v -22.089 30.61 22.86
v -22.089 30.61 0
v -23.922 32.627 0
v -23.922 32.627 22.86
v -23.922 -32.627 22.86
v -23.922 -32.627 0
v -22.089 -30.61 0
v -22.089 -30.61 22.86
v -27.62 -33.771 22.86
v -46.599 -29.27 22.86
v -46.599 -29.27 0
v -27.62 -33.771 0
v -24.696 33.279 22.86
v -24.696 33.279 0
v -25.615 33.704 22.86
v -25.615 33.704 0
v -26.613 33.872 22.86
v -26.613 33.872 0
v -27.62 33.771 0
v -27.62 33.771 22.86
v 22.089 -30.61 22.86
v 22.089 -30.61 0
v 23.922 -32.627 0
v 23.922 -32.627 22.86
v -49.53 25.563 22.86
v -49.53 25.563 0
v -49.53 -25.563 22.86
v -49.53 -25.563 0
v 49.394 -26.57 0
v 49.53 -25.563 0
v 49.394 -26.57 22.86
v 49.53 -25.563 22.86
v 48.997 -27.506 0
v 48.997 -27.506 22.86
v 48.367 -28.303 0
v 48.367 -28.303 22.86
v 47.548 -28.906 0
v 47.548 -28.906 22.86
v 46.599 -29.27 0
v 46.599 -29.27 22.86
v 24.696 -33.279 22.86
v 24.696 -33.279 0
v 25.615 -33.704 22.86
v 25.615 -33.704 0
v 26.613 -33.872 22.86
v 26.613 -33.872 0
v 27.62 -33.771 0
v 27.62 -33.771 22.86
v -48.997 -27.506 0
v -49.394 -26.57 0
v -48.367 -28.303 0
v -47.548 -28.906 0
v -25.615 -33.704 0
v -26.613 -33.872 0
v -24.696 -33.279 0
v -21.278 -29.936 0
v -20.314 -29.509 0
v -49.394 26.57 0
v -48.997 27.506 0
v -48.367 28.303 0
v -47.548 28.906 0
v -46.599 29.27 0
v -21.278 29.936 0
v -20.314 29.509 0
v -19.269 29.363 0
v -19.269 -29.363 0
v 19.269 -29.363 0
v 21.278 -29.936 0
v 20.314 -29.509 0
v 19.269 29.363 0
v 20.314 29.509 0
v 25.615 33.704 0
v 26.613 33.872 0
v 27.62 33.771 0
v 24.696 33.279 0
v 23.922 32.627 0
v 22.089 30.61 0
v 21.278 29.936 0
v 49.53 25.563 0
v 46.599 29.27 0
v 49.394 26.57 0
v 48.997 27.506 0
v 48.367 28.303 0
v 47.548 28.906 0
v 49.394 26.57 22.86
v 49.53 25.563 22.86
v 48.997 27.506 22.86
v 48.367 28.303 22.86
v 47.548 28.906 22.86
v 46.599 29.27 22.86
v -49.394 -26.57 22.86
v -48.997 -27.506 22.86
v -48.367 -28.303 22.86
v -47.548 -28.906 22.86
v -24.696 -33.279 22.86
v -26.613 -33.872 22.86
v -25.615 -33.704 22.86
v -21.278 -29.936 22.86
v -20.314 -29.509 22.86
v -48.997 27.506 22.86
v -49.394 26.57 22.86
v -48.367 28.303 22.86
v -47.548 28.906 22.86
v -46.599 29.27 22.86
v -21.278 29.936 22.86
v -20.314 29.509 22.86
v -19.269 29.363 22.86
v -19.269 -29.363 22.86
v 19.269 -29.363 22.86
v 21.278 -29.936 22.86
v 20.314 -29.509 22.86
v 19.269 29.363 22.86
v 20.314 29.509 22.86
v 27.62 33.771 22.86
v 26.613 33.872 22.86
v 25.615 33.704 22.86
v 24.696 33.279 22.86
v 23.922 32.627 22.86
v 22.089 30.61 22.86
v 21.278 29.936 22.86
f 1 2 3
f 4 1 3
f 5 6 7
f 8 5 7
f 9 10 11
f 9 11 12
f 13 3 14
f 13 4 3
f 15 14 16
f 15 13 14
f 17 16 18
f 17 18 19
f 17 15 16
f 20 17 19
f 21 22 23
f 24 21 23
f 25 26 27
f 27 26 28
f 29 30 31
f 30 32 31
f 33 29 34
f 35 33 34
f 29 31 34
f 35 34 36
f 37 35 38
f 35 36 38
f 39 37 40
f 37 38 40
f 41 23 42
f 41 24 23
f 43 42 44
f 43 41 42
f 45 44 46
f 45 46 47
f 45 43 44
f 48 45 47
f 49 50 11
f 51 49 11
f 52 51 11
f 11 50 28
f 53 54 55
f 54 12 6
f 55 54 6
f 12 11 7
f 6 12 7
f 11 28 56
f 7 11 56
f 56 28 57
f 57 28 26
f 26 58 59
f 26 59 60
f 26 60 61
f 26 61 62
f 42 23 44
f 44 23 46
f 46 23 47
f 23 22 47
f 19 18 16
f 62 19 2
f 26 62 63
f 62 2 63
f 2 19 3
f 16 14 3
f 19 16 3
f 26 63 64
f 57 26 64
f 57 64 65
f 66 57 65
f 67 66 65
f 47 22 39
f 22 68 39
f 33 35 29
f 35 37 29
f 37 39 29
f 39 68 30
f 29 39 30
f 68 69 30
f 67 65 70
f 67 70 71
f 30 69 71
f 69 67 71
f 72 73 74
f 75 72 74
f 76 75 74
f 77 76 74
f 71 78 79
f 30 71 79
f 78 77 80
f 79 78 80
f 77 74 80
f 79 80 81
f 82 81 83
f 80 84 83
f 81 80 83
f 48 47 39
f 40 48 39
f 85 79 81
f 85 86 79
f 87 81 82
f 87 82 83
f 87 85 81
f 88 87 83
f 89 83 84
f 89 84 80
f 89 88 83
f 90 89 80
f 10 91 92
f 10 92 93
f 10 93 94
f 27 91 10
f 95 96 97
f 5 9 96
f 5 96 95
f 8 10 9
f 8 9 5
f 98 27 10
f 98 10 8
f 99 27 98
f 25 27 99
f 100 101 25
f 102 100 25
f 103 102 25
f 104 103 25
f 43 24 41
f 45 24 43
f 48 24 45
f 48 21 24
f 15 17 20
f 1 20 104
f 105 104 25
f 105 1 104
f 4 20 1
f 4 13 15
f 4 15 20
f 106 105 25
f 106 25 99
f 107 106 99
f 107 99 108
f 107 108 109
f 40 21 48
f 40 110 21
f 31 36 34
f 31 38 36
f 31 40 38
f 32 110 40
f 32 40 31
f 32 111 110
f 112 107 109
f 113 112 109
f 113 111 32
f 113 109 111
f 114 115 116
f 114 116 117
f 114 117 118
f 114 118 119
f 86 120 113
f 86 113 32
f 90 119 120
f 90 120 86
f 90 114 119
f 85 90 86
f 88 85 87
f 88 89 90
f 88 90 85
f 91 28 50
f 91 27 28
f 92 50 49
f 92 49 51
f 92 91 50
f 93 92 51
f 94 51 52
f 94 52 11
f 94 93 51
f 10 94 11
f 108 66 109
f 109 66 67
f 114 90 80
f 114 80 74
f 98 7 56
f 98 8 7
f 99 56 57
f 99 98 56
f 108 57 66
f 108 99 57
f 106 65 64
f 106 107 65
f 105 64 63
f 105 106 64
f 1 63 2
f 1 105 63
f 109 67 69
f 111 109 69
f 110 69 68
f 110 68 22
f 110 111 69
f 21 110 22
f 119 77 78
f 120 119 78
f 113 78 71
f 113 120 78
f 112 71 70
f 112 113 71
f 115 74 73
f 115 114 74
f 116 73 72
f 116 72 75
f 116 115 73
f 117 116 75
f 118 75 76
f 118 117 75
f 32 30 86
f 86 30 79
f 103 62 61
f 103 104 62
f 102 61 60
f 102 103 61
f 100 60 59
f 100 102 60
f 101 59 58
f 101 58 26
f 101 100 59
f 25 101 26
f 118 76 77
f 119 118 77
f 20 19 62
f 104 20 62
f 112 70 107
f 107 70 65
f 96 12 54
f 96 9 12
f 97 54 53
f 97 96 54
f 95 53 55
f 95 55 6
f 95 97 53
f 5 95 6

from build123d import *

# Parameters (mm, degrees)
F1_DEPTH = 76.2
F2_R     = 12.7
F3_SCALE = 0.3


with BuildPart() as f1:
    # F0 (on Top) → F1 (new body)
    with BuildSketch(Plane.XY):
        Polygon((165.1, -95.25), (165.1, 95.25), (84.7781474317, 114.3), (69.85, 97.8762737351), (0, 97.8762737351), (-69.85, 97.8762737351), (-84.7781474317, 114.3), (-165.1, 95.25), (-165.1, -95.25), (-84.7781474317, -114.3), (-69.85, -97.8762737351), (0, -97.8762737351), (69.85, -97.8762737351), (84.7781474317, -114.3), align=None)
    extrude(amount=F1_DEPTH)

    # F2
    f2_edges = [f1.edges().sort_by_distance(p)[0] for p in [
        (-165.1, -95.25, 38.1),
        (-84.778147, -114.3, 38.1),
        (-69.85, -97.876274, 38.1),
        (69.85, -97.876274, 38.1),
        (84.778147, -114.3, 38.1),
        (165.1, -95.25, 38.1),
        (165.1, 95.25, 38.1),
        (84.778147, 114.3, 38.1),
        (69.85, 97.876274, 38.1),
        (-69.85, 97.876274, 38.1),
        (-84.778147, 114.3, 38.1),
        (-165.1, 95.25, 38.1),
    ]]
    fillet(f2_edges, radius=F2_R)


with BuildPart() as f1_1:
    # F3: moved
    add(f1.part.scale(F3_SCALE))


solid = f1_1.part
